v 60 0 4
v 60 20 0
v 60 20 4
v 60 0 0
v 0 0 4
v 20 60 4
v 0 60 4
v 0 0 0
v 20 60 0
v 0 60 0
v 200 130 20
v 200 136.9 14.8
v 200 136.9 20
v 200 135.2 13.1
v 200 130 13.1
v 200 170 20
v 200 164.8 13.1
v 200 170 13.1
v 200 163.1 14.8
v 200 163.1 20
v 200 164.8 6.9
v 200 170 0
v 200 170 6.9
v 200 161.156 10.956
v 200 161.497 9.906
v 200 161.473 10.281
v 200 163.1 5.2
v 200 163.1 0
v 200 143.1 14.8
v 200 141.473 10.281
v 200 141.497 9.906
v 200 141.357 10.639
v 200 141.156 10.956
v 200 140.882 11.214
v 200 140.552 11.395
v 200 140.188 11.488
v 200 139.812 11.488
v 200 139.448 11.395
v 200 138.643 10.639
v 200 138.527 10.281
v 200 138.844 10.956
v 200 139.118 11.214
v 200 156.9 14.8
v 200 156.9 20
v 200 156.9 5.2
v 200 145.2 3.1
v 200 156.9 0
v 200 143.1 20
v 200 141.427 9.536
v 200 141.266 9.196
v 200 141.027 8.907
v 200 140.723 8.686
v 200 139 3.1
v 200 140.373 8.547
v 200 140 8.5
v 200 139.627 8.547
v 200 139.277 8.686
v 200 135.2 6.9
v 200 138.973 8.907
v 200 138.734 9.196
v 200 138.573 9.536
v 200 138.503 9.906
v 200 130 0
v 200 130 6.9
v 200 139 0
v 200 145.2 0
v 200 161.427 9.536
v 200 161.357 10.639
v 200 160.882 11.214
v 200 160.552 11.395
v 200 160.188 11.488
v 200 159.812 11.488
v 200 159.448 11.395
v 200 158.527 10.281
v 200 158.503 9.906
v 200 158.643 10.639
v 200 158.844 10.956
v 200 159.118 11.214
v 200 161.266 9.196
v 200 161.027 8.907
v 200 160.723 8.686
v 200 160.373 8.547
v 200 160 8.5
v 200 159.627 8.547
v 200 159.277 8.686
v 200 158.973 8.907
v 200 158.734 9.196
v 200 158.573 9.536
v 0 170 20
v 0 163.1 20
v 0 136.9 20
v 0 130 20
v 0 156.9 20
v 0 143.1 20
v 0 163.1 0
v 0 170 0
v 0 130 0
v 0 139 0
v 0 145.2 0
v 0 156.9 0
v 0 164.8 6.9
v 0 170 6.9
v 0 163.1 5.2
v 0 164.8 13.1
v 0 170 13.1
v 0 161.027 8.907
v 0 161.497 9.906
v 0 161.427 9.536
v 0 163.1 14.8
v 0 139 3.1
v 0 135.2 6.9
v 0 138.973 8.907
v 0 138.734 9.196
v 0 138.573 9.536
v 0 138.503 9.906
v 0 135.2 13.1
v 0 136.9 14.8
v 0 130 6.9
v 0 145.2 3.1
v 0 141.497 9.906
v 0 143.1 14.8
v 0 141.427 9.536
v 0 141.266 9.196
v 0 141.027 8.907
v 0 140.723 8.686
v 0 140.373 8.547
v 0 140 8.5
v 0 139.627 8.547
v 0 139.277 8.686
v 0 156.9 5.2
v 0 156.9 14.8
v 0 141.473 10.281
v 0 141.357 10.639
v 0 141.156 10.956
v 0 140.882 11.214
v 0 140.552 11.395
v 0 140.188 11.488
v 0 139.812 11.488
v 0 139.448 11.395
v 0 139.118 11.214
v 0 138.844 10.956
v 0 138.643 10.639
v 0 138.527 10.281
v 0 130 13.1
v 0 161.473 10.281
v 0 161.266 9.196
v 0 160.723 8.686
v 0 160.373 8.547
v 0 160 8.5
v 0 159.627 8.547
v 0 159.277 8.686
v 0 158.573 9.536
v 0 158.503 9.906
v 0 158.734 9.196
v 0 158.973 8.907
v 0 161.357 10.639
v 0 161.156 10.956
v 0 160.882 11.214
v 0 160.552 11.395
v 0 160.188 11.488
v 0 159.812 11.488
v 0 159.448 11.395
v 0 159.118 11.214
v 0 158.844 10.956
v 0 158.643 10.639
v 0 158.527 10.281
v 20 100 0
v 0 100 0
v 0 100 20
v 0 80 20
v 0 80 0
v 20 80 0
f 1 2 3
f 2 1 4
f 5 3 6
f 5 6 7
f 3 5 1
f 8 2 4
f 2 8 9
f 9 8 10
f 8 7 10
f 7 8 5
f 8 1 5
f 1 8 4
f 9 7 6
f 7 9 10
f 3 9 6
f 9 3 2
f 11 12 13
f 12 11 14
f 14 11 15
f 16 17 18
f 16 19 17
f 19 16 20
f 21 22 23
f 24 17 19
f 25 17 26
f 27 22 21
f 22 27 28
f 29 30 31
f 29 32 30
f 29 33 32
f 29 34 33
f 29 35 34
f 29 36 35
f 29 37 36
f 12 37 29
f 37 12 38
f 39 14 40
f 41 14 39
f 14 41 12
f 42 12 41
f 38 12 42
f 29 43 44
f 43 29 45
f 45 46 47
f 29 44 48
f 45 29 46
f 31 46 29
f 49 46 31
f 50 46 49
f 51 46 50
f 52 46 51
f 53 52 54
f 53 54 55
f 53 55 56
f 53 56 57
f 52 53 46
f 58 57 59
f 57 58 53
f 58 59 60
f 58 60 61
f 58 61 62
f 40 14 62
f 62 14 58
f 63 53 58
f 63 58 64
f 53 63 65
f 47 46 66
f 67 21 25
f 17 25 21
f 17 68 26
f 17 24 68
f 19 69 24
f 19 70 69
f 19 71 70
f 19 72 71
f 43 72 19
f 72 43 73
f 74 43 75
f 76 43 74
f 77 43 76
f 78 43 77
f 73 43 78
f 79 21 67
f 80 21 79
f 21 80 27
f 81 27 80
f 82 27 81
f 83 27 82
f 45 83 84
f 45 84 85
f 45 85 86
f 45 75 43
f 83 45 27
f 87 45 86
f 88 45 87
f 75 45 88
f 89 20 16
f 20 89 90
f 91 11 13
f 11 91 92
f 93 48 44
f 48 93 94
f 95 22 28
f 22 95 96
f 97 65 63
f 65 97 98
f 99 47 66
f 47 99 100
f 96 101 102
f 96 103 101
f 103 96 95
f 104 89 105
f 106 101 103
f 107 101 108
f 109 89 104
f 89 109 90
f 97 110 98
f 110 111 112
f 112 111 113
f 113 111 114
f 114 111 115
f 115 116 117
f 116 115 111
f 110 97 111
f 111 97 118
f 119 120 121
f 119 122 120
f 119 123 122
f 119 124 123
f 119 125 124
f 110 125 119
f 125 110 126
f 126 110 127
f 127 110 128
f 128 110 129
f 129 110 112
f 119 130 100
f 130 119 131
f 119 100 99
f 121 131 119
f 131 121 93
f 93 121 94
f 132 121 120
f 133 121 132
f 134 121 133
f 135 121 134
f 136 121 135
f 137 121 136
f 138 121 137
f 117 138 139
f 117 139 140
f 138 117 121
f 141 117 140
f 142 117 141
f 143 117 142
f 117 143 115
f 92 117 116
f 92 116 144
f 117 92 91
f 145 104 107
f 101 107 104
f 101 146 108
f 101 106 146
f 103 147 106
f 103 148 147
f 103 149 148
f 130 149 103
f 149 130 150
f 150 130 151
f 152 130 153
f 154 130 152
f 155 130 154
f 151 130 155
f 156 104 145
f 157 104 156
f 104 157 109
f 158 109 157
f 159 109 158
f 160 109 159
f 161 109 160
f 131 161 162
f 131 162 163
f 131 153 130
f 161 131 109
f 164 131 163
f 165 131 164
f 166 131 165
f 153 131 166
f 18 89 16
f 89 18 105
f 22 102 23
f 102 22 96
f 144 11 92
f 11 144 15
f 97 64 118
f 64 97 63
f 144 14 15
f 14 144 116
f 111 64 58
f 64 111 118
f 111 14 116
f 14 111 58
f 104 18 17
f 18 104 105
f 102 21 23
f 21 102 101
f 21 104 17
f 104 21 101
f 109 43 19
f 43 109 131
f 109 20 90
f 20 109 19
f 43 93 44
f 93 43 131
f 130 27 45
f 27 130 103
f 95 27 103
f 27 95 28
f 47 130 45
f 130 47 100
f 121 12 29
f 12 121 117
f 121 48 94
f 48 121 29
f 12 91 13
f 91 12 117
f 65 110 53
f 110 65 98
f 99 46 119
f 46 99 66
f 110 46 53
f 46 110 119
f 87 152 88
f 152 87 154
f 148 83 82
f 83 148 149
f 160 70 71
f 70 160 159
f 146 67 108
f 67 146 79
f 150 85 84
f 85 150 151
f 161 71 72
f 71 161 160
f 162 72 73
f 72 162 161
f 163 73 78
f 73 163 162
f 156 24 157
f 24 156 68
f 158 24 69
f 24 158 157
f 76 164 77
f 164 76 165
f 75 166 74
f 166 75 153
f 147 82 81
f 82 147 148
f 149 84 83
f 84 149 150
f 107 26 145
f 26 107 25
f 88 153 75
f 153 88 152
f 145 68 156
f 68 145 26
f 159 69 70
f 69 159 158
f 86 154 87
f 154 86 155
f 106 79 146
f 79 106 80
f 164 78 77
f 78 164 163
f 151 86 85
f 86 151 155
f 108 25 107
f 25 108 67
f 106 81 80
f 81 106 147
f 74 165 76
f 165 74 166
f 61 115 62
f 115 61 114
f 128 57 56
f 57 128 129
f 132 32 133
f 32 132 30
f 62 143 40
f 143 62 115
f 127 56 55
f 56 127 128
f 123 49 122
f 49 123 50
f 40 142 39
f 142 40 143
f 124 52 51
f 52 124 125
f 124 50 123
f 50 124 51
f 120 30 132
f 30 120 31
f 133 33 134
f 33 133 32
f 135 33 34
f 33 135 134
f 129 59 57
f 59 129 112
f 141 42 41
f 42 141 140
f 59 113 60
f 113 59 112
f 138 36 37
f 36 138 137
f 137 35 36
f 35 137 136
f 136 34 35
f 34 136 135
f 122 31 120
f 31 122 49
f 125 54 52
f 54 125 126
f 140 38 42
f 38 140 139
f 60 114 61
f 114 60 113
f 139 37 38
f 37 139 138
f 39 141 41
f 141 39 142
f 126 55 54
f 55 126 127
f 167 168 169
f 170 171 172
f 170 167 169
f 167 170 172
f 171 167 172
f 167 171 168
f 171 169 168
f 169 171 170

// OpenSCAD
$fn = 25;

module alExt_2040(l) {
    translate([l/2,20,10]) {
        color("DimGray") {
            difference() {
                // main body
                cube([l,40,20], center=true);

                // slots
                translate([0,-(40/2)+(6.2/2)-1])cube([l+2,6.2,6.2], center=true);
                mirror([0,1,0])translate([0,-(40/2)+(6.2/2)-1])cube([l+2,6.2,6.2], center=true);

                translate([0,10,(20/2)-(6.2/2)+1])cube([l+2,6.2,6.2], center=true);
                mirror([0,0,1])translate([0,10,(20/2)-(6.2/2)+1])cube([l+2,6.2,6.2], center=true);
                mirror([0,1,0])translate([0,10,(20/2)-(6.2/2)+1])cube([l+2,6.2,6.2], center=true);
                mirror([0,1,1])translate([0,10,(20/2)-(6.2/2)+1])cube([l+2,6.2,6.2], center=true);

                // holes
                translate([0,10,0])rotate([0,90,0])cylinder(h=l+2, d=3, center=true);
                mirror([0,1,0])translate([0,10,0])rotate([0,90,0])cylinder(h=l+2, d=3, center=true);
            }
        }
    }
}

module angle_corner() {
    color("DimGrey") {
        translate([0,20,0]){
            rotate([90,0,0]) {
                linear_extrude(height=20)polygon([[0,0],[20,0], [0,20]]);
            }
        }
    }
}

module joining_plate() {
    color("DimGray") {
        union() {
            cube([60,20,4]);
            cube([20,60,4]);

            translate([20,20,0]) {
                linear_extrude(height=4)polygon([[0,0],[40,0],[0,40]]);
            }
        }
    }
}

// Sample of parts
joining_plate();
translate([0,80,0])angle_corner();
translate([0,130,0])alExt_2040(200);
